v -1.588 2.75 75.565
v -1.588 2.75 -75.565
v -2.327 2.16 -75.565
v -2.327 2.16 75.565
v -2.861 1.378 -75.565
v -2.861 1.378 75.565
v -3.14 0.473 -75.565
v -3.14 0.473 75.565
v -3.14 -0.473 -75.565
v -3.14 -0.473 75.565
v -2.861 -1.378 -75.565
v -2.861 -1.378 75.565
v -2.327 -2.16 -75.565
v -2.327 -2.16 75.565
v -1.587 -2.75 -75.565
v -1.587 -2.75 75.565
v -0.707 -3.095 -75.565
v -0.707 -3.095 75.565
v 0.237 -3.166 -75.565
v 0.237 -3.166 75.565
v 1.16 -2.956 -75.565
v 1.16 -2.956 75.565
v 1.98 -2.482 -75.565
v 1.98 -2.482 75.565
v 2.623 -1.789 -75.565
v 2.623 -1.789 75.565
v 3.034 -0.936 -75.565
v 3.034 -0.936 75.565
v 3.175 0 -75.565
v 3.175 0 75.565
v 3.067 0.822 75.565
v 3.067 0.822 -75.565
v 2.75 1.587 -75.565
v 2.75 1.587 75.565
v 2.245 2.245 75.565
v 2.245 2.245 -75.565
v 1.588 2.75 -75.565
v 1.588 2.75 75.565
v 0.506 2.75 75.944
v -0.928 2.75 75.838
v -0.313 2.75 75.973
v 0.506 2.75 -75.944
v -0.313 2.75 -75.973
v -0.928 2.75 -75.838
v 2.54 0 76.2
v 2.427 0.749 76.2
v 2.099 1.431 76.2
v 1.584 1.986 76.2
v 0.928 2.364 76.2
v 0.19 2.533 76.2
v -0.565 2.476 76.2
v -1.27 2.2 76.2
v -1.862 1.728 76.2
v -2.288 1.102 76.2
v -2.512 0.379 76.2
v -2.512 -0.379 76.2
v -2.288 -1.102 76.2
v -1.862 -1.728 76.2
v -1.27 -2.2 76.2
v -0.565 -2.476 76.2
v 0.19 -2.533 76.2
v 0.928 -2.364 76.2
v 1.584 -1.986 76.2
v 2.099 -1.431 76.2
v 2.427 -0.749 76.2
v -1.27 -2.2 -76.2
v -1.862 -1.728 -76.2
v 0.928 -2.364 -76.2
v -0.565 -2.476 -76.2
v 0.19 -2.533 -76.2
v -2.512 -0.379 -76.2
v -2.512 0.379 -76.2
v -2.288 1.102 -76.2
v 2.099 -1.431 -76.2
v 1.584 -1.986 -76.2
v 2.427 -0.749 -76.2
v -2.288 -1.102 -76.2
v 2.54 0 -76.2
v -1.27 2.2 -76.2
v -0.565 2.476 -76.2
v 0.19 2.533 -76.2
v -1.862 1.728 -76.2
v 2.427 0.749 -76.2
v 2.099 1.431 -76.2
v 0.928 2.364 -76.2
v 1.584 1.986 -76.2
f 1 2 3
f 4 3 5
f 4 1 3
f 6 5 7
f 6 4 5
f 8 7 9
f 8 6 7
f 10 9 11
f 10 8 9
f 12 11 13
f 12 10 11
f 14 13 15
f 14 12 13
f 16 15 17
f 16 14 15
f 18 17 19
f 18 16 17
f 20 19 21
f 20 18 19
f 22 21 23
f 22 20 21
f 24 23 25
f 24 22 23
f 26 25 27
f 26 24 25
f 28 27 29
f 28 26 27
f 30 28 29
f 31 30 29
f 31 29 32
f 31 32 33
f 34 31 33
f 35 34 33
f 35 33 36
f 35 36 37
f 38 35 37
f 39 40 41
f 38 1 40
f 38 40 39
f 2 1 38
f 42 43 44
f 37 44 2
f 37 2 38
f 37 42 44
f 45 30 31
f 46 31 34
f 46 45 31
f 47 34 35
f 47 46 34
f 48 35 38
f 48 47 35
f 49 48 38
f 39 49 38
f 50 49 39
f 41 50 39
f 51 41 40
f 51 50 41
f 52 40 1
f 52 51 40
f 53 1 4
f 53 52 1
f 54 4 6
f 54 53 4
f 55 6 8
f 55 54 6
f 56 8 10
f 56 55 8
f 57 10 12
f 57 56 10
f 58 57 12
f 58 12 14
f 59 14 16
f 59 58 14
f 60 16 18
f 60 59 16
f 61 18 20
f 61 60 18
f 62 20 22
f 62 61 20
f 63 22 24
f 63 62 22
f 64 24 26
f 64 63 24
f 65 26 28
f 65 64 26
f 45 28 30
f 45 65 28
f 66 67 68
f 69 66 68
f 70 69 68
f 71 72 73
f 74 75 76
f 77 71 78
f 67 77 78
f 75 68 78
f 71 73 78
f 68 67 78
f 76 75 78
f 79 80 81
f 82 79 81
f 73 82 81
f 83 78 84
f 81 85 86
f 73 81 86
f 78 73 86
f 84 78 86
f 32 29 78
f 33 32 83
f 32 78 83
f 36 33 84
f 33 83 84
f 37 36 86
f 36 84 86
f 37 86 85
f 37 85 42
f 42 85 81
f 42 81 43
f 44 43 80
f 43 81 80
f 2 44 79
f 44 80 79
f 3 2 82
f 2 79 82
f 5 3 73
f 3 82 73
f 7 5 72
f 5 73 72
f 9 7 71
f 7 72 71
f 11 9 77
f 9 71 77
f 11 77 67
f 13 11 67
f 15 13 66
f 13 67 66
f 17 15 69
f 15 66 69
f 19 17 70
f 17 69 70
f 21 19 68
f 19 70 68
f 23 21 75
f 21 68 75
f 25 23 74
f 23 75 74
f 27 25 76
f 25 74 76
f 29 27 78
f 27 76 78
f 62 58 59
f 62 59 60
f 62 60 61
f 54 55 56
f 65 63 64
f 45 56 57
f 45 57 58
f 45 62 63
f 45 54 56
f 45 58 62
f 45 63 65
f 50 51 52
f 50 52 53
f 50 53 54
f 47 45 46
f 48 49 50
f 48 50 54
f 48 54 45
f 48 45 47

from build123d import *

# Parameters (mm, degrees)
SKETCH1_R           = 3.175
EXTRUDE1_DEPTH      = 76.2
CHAMFER1_SIZE       = 0.635
EXTRUDE7_DEPTH      = 77.2
EXTRUDE7_DEPTH_BACK = 77.2


with BuildPart() as part:
    # Sketch1 → Extrude1 (new body, symmetric)
    with BuildSketch(Plane.XY):
        Circle(SKETCH1_R)
    extrude(amount=EXTRUDE1_DEPTH, both=True)

    # Chamfer1
    chamfer1_edges = [part.edges().sort_by_distance(p)[0] for p in [
        (-3.175, 0, -76.2),
        (-3.175, 0, 76.2),
    ]]
    chamfer(chamfer1_edges, length=CHAMFER1_SIZE)

    # Sketch13 → Extrude7 (cut, two sides)
    with BuildSketch(Plane.XY) as extrude7_sk:
        with BuildLine():
            Line((-1.5875, 2.749630657), (1.5875, 2.749630657))
            ThreePointArc((1.5875, 2.749630657), (0, 3.175), (-1.5875, 2.749630657))
        make_face()
    extrude(amount=EXTRUDE7_DEPTH, mode=Mode.SUBTRACT)
    extrude(extrude7_sk.sketch, amount=-EXTRUDE7_DEPTH_BACK, mode=Mode.SUBTRACT)


solid = part.part
